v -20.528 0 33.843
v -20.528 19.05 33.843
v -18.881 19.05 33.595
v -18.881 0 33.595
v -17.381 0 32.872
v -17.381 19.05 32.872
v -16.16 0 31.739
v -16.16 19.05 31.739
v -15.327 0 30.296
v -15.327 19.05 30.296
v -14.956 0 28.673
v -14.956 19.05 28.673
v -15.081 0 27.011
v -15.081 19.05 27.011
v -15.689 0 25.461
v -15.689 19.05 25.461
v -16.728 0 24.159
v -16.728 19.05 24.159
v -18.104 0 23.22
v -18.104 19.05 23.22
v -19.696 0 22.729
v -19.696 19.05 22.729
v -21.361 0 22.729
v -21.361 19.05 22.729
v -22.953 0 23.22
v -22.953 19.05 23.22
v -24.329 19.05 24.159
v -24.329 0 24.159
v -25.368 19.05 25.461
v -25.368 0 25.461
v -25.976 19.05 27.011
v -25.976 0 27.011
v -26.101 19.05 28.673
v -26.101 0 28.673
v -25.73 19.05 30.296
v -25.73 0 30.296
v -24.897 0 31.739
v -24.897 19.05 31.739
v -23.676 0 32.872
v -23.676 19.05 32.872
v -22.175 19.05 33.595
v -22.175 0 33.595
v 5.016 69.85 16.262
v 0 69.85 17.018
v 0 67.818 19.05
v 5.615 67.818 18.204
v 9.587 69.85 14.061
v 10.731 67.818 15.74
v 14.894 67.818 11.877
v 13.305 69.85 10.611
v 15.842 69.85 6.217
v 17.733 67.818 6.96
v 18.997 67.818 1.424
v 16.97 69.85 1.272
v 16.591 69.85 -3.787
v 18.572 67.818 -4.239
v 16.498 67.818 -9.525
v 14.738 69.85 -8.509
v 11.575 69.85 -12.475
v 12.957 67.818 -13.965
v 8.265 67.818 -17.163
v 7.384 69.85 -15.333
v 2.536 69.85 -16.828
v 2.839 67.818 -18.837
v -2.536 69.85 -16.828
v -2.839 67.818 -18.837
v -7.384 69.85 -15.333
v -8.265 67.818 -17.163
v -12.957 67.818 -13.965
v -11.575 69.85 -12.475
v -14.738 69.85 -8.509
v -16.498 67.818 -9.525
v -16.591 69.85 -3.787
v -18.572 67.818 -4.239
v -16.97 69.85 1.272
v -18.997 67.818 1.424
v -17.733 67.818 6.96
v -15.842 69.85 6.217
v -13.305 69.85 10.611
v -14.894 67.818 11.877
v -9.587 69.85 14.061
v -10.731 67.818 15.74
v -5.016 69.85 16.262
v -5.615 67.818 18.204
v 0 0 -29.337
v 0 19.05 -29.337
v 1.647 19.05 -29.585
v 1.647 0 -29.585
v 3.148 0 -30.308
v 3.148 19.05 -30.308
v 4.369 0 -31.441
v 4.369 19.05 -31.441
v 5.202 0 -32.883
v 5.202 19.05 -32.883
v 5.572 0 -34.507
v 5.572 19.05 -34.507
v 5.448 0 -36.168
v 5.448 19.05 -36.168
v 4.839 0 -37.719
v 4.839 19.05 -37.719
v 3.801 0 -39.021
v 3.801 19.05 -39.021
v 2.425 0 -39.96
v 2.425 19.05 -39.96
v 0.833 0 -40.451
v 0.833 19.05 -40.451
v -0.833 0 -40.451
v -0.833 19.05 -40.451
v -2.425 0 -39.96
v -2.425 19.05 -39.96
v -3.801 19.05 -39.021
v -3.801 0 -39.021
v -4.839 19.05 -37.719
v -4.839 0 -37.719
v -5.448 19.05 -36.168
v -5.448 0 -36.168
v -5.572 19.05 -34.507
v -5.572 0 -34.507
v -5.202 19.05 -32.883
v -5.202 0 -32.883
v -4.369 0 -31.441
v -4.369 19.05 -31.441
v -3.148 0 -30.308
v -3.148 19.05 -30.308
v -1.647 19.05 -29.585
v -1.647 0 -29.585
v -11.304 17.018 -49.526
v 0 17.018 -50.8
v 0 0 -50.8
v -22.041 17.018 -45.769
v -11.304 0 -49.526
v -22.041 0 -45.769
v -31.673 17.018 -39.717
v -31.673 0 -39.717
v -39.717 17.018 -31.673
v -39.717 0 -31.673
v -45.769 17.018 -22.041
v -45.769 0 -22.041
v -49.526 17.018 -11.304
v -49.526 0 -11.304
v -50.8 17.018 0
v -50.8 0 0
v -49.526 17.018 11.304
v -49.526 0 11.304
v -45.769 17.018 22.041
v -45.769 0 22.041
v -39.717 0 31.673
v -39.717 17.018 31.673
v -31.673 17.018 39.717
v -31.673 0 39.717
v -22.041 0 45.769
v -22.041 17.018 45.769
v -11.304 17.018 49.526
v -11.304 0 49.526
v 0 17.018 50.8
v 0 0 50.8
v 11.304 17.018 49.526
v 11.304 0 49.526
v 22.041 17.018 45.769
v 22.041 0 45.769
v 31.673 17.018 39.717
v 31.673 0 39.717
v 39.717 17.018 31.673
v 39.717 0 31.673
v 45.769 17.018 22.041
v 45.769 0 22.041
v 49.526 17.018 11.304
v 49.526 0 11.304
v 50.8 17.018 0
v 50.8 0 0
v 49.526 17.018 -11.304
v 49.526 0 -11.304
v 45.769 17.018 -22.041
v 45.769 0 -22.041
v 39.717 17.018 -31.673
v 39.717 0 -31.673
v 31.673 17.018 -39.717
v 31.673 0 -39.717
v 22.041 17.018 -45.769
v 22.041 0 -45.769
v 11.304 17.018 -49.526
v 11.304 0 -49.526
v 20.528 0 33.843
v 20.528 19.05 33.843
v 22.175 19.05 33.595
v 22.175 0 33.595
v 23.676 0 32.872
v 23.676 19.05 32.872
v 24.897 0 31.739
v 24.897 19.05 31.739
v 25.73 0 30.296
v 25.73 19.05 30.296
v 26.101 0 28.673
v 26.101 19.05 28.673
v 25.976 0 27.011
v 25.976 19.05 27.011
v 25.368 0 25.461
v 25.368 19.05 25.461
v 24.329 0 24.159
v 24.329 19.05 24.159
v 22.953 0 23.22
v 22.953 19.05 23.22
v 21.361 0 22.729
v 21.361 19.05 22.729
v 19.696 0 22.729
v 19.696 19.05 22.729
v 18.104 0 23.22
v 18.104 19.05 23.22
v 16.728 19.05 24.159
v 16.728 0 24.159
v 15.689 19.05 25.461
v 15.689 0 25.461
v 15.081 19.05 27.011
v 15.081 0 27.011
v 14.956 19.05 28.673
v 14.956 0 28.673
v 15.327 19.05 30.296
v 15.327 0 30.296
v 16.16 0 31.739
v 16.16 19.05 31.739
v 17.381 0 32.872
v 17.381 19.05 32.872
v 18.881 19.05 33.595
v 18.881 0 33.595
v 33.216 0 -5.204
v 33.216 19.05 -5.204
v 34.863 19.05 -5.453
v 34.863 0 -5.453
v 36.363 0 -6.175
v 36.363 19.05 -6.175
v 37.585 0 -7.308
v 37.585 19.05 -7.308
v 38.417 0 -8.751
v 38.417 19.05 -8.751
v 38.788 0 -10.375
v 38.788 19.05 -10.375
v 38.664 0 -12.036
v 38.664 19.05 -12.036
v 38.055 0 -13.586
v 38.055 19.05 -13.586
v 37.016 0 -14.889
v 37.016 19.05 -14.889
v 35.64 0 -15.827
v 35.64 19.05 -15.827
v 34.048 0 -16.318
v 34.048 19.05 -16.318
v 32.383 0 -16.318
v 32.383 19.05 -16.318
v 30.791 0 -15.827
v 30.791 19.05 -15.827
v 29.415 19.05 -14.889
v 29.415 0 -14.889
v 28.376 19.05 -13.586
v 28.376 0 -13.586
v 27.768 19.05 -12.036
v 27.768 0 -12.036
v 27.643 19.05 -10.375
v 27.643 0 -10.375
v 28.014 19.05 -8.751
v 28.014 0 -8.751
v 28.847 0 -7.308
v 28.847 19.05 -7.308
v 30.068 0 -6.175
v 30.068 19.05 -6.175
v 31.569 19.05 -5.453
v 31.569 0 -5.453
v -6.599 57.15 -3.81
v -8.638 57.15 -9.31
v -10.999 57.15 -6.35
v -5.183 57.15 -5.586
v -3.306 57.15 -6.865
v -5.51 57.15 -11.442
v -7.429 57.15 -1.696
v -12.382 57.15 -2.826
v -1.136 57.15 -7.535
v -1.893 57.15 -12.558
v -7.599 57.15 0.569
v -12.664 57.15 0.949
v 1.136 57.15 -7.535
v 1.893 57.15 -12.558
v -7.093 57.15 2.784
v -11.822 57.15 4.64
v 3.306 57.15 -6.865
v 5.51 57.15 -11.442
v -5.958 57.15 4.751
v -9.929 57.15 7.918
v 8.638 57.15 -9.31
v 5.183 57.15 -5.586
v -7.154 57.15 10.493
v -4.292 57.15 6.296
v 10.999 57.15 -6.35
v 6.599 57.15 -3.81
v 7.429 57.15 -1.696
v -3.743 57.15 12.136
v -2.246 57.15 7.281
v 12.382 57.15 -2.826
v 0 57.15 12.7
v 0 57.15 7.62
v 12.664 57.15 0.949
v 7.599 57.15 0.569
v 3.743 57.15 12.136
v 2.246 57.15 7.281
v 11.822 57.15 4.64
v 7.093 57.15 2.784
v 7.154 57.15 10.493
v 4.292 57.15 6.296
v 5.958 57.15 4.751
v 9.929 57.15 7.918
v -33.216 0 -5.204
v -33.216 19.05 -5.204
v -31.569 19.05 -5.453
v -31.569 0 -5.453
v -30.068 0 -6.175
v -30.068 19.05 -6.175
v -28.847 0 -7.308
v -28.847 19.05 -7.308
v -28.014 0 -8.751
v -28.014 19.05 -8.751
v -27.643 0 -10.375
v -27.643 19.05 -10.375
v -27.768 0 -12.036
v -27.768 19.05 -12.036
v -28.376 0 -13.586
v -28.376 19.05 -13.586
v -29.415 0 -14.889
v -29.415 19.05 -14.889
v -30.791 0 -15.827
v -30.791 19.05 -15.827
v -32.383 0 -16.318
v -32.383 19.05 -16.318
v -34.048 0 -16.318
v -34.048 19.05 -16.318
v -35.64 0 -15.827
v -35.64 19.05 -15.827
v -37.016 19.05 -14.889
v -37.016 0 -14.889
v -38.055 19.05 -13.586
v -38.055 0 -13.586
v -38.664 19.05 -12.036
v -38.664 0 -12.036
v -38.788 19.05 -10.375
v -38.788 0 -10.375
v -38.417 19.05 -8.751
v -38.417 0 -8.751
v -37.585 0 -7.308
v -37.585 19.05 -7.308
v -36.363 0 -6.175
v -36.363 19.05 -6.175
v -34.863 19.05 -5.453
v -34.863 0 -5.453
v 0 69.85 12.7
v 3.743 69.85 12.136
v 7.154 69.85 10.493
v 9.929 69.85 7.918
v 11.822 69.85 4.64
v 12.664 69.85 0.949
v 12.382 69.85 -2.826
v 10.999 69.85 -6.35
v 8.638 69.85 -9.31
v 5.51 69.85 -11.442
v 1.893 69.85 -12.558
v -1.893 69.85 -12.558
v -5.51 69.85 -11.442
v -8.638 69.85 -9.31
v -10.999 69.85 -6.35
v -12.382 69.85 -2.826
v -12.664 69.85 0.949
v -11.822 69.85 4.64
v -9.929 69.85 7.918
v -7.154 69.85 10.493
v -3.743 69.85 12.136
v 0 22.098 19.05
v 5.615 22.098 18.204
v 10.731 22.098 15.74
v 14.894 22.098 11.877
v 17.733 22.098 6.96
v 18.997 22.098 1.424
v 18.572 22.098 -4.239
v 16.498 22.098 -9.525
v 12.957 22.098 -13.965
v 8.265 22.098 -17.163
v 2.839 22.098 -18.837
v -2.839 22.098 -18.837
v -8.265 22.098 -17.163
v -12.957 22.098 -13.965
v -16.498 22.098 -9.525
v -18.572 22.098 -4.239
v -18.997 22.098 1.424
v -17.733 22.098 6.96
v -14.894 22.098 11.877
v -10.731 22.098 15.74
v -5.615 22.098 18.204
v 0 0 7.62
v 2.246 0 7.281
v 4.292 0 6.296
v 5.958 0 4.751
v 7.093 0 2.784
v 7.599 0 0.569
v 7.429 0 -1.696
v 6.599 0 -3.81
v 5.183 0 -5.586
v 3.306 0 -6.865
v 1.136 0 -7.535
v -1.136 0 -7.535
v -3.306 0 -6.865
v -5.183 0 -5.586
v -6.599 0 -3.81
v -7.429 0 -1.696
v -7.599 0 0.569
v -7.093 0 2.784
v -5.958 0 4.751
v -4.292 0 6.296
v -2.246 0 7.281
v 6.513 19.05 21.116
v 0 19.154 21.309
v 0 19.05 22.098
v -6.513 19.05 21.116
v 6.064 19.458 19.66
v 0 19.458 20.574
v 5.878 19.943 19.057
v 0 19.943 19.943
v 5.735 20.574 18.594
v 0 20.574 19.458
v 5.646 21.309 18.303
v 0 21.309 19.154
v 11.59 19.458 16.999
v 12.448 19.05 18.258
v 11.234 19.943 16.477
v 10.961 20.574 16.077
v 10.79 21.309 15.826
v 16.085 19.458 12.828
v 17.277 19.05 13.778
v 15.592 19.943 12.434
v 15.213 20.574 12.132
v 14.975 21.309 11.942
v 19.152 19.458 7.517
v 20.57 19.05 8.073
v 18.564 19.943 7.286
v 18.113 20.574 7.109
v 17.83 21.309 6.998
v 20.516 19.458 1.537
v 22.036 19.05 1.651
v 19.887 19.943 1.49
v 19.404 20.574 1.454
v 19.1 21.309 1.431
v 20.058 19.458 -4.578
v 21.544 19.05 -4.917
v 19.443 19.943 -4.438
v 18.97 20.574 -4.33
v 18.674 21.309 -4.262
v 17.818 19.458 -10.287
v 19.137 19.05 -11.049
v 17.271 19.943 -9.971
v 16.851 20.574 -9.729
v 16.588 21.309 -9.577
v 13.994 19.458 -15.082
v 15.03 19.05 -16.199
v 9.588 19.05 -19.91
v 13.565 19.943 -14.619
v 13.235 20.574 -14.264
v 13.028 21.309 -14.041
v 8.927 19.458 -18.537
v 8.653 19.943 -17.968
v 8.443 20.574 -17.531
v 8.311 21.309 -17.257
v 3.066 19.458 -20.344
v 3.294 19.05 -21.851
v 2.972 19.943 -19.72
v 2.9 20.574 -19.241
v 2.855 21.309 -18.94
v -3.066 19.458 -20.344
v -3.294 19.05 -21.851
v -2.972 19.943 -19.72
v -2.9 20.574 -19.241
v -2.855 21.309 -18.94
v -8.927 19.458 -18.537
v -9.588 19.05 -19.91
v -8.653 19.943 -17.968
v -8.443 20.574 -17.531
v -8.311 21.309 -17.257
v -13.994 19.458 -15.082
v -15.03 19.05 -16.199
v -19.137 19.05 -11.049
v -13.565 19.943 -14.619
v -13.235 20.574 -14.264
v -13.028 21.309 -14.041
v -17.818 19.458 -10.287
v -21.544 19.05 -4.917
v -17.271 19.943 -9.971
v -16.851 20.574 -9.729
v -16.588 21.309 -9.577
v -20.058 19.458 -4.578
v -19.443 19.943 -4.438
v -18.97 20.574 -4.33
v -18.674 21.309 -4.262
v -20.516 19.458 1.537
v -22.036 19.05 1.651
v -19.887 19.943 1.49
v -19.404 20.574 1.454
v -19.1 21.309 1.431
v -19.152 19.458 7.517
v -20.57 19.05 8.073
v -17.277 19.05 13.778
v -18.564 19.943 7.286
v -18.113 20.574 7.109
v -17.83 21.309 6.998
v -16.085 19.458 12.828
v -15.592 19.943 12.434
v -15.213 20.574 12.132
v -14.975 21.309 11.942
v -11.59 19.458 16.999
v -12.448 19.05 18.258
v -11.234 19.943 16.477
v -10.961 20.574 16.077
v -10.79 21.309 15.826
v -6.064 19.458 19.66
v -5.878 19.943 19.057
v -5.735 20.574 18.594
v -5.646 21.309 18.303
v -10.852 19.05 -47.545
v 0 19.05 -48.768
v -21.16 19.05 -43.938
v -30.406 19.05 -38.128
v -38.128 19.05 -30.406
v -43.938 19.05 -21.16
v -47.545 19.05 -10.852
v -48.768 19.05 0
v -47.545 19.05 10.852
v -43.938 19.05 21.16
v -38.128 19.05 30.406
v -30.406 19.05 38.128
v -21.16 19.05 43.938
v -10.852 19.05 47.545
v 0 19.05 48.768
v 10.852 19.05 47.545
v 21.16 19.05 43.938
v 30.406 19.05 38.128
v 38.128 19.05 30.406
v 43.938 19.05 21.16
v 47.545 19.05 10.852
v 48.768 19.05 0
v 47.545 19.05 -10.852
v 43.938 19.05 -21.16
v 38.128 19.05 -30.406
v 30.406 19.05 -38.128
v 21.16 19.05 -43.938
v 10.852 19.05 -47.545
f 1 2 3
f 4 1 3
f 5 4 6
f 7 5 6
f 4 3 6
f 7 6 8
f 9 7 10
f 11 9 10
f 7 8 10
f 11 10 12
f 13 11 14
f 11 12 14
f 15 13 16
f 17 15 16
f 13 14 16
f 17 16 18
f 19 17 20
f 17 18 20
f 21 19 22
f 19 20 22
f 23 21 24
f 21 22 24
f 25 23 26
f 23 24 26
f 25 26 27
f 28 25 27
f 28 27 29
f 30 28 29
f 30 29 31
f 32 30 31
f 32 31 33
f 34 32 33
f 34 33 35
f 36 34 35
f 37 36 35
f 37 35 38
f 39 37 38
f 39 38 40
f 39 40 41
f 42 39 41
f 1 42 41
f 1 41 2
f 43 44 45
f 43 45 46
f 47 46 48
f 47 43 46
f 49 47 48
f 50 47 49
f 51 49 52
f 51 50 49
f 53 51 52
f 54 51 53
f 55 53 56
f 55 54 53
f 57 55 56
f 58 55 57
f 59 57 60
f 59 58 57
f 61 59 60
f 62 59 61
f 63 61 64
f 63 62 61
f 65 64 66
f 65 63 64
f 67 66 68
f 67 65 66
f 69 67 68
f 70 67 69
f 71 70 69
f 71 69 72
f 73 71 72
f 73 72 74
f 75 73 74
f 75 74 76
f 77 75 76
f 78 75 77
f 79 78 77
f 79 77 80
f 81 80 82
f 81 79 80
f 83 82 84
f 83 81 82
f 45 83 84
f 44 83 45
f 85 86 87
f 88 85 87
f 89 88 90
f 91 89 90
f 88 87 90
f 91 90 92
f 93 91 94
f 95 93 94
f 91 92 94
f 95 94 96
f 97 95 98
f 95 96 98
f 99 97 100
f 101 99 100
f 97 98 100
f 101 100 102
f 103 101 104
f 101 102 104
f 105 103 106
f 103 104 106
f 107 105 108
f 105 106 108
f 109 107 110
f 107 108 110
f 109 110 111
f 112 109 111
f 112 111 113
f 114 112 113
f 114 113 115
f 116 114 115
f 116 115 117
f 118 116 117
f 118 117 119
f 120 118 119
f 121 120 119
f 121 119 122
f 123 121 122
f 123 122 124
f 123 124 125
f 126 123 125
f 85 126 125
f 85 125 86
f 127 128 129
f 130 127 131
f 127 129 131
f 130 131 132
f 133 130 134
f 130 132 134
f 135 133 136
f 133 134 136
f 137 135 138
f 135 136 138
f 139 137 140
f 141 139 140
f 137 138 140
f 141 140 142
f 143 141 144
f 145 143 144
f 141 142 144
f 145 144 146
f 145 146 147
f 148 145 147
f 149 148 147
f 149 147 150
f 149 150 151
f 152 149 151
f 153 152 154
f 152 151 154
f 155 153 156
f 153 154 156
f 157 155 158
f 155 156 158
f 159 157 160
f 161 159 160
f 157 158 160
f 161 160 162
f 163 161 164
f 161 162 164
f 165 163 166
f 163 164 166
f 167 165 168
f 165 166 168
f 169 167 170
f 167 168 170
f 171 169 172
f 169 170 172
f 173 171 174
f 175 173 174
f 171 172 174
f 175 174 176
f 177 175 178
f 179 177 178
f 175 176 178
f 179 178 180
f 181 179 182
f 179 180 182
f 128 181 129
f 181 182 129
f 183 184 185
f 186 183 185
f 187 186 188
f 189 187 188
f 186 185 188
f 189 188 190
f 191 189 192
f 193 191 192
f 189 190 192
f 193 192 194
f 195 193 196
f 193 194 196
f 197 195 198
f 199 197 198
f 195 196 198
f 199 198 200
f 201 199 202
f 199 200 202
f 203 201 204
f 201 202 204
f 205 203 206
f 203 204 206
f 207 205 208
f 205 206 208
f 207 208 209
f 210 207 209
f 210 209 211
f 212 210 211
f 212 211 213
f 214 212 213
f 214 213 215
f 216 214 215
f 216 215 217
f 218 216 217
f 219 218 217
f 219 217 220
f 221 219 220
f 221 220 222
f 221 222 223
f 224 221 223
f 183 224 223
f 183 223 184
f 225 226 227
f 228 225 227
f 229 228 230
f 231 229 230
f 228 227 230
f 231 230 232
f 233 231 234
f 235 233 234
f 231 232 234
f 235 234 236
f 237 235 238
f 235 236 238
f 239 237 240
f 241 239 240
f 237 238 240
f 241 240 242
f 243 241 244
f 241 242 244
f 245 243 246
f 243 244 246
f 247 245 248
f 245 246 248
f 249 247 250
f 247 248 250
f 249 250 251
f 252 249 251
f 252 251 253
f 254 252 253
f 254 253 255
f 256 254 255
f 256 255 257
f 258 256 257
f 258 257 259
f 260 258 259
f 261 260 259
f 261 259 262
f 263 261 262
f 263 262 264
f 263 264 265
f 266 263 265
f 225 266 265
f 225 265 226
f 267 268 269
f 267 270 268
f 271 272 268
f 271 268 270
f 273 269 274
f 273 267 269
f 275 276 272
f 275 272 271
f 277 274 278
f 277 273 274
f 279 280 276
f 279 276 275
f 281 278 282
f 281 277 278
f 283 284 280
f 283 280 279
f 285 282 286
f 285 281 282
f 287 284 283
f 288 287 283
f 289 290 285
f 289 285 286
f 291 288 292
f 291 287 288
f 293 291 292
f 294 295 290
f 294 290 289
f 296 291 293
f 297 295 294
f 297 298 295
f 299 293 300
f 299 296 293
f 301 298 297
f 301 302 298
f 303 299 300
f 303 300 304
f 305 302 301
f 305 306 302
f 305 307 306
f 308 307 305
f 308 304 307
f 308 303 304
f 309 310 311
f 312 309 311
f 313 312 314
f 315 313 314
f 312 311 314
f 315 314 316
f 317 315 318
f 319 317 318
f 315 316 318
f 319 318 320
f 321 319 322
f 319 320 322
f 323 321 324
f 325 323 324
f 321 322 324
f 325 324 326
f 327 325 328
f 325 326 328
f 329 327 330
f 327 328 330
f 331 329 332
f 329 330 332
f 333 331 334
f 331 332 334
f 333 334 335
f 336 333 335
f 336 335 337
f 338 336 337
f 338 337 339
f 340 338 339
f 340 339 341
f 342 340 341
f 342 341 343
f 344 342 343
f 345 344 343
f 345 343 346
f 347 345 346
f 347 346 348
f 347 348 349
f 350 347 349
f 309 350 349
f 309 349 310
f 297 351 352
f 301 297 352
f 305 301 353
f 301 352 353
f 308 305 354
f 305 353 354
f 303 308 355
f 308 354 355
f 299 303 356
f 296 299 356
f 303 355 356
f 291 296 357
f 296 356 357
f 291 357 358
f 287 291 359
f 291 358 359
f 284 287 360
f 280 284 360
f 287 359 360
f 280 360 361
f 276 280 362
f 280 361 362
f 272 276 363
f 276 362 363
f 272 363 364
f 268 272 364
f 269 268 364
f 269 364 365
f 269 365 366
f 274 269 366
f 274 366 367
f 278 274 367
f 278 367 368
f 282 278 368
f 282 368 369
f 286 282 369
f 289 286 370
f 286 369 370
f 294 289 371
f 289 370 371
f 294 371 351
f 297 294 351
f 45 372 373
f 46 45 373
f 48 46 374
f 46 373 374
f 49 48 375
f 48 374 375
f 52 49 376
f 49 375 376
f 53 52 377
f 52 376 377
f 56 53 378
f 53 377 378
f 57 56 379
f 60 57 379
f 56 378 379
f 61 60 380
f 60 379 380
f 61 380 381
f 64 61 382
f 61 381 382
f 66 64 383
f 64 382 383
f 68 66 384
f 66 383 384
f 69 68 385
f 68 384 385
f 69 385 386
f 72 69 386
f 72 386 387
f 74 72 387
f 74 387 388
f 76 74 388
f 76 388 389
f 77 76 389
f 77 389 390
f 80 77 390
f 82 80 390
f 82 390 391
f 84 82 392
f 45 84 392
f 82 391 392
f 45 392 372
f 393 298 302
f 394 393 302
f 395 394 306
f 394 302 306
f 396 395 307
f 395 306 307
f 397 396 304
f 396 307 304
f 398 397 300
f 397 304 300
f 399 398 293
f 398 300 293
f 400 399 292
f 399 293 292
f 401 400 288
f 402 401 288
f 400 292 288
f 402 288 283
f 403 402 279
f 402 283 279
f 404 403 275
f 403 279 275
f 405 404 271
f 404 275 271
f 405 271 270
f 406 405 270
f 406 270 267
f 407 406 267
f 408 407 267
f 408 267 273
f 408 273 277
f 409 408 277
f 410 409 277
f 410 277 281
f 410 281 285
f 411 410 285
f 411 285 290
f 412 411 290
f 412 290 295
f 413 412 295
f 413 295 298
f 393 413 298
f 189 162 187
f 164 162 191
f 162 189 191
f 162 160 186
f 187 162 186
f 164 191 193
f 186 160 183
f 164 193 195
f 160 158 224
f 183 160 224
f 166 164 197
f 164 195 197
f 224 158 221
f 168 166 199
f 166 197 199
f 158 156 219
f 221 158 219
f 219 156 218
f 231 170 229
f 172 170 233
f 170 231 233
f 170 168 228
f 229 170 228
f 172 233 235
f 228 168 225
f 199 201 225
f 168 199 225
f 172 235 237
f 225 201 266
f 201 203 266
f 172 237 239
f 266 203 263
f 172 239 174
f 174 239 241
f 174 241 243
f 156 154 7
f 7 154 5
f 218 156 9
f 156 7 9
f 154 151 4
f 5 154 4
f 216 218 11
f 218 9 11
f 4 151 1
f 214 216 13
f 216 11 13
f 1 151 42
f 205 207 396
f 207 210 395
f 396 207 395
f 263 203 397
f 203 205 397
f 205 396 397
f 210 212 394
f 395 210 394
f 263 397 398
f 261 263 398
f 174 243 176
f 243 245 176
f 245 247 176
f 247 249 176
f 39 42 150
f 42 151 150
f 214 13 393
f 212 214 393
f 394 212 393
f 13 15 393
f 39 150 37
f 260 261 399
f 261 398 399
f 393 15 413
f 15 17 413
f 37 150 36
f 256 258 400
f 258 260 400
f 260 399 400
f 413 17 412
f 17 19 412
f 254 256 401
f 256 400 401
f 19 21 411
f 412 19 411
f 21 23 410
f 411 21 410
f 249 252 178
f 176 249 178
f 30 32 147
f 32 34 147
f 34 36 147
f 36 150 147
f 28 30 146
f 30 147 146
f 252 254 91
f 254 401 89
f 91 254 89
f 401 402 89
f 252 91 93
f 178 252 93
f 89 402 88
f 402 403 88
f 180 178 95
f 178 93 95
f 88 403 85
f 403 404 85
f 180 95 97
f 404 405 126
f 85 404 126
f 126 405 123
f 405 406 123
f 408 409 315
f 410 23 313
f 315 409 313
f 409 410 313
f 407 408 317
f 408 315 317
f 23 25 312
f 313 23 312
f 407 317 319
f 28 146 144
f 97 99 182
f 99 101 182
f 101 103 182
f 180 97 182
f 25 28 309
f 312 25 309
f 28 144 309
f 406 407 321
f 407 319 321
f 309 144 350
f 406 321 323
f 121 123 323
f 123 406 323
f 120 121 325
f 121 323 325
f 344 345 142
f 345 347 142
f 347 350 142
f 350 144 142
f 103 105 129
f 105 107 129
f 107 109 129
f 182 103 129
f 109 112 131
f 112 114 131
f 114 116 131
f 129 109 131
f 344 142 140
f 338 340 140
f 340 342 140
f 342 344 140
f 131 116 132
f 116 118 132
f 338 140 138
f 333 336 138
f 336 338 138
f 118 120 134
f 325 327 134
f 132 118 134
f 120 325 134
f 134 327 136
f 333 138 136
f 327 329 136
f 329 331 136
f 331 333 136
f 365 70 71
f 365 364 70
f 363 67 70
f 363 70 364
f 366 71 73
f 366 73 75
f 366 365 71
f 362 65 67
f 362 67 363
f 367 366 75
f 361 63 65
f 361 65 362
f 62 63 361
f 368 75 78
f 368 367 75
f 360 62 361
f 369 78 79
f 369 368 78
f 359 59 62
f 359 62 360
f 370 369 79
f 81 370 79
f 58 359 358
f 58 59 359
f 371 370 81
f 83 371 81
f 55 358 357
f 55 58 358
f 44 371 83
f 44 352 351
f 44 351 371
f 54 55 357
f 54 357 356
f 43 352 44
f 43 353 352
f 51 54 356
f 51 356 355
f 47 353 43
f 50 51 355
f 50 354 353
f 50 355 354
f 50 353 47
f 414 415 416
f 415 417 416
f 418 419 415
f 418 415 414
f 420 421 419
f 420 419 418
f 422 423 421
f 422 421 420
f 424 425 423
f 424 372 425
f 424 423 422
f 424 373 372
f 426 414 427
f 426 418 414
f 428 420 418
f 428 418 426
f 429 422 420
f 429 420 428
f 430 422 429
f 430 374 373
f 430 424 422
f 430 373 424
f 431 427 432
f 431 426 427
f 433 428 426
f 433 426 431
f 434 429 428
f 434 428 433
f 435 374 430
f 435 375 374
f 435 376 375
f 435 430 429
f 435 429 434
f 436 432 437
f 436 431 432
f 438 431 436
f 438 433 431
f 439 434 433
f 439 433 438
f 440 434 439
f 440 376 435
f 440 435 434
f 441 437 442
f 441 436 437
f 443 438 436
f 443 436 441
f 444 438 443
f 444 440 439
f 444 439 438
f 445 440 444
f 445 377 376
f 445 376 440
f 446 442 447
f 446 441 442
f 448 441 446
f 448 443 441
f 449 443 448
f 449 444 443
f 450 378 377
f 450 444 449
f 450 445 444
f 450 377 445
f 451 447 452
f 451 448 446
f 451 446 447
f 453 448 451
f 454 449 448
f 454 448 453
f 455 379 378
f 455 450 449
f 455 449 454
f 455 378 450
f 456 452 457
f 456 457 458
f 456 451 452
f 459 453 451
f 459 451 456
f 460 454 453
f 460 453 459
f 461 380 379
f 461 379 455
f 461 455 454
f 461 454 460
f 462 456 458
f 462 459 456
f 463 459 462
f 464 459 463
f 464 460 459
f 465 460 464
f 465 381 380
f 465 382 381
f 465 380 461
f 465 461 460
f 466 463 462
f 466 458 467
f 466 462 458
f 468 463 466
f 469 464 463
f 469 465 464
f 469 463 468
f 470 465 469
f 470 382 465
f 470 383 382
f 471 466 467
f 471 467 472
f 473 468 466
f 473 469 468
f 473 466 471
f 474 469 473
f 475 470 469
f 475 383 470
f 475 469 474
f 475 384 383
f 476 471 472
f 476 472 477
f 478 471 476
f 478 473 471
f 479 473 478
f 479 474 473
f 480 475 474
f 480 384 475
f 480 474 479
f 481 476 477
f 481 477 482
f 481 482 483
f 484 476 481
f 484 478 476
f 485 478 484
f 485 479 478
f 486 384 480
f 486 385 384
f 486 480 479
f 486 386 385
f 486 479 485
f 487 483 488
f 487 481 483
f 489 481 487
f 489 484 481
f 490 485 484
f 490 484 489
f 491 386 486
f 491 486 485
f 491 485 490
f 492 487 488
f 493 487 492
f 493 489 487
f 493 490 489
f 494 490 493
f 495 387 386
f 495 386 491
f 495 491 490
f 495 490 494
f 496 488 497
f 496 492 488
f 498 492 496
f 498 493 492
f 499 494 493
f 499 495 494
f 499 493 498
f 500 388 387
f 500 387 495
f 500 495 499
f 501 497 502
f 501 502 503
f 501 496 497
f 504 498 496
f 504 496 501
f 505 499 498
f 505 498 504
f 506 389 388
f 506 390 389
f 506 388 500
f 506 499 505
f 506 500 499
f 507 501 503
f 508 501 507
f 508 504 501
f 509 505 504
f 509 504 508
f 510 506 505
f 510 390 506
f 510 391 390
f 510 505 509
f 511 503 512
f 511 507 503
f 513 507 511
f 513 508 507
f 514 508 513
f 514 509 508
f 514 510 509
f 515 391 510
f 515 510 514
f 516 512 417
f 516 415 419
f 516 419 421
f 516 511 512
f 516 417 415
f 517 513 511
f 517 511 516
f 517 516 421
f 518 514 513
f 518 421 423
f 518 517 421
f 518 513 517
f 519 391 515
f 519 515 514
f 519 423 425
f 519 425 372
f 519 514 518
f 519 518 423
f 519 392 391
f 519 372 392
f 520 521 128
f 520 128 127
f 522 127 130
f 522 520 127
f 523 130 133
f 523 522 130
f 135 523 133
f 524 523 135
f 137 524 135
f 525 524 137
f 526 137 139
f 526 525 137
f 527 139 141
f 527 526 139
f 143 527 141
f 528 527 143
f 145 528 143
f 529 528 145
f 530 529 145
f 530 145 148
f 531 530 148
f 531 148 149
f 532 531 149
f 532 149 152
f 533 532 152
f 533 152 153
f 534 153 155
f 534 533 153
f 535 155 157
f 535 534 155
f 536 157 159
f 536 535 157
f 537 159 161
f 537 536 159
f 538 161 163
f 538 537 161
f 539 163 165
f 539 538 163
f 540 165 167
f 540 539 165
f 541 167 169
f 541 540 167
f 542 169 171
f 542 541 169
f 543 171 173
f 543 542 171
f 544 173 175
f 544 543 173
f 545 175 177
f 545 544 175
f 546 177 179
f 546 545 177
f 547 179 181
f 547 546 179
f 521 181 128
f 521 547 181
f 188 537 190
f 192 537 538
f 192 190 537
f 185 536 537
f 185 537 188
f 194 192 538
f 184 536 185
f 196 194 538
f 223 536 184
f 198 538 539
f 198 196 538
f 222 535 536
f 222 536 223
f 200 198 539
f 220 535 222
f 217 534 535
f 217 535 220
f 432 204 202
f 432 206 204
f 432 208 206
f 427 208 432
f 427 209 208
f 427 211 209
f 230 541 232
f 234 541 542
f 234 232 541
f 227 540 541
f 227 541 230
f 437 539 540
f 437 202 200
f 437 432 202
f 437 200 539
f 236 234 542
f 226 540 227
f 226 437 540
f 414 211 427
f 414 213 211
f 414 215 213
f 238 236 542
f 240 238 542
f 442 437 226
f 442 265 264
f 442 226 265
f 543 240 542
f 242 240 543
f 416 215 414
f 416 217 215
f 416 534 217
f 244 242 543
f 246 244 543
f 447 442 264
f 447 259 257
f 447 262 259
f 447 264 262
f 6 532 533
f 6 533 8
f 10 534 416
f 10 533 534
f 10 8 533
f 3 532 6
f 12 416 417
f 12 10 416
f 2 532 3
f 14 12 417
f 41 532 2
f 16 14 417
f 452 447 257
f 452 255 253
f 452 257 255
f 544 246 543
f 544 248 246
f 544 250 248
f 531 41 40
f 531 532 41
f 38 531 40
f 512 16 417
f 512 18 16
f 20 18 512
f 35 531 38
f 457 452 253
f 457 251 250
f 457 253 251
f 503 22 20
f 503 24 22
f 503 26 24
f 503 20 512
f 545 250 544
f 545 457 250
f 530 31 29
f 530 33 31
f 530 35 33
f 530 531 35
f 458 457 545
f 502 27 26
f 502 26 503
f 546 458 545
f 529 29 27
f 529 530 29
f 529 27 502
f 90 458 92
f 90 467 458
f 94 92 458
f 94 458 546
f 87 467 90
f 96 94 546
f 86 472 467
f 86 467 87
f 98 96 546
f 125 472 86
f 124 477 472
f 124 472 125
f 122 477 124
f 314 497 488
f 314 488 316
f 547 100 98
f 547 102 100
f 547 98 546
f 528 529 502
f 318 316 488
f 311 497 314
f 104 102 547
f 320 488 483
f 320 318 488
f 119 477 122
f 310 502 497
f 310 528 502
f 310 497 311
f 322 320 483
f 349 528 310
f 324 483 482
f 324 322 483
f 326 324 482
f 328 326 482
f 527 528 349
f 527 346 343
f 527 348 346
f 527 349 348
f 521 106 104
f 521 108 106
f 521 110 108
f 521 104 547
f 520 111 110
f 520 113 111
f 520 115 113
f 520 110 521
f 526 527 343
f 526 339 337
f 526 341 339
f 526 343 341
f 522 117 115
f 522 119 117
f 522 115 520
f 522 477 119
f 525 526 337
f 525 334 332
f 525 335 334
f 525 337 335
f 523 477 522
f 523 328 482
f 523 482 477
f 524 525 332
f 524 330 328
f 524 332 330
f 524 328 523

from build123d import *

# Parameters (mm, degrees)
SKETCH1_R           = 50.8
BOSS_EXTRUDE1_DEPTH = 19.05
CHAMFER1_SIZE       = 2.032
SKETCH2_R           = 5.588
CUT_EXTRUDE2_DEPTH  = 75.324844433
SKETCH4_R           = 19.05
BOSS_EXTRUDE2_DEPTH = 50.8
FILLET1_R           = 3.048
CHAMFER2_SIZE       = 2.032
SKETCH5_R           = 12.7
CUT_EXTRUDE3_DEPTH  = 12.7
SKETCH6_R           = 7.62
CUT_EXTRUDE4_DEPTH  = 92.800885072


with BuildPart() as part:
    # Sketch1 → Boss-Extrude1 (new body)
    with BuildSketch(Plane(origin=(0, 0, 0), x_dir=(1, 0, 0), z_dir=(0, 1, 0))):
        with Locations(Location((0, 0, 0), (0, 0, 90))):
            Circle(SKETCH1_R)
    extrude(amount=BOSS_EXTRUDE1_DEPTH)

    # Chamfer1
    chamfer1_edges = [part.edges().sort_by_distance(p)[0] for p in [
        (0, 19.05, 50.8),
    ]]
    chamfer(chamfer1_edges, length=CHAMFER1_SIZE)

    # Sketch2 → Cut-Extrude2 (cut, through all)
    with BuildSketch(Plane(origin=(0, 19.05, 0), x_dir=(1, 0, 0), z_dir=(0, 1, 0))):
        with Locations(Location((0, 34.925, 0), (0, 0, 270))):
            Circle(SKETCH2_R)
        with Locations(Location((33.215648832, 10.792418529, 0), (0, 0, 270))):
            Circle(SKETCH2_R)
        with Locations(Location((20.528399936, -28.254918529, 0), (0, 0, 270))):
            Circle(SKETCH2_R)
        with Locations(Location((-20.528399936, -28.254918529, 0), (0, 0, 270))):
            Circle(SKETCH2_R)
        with Locations(Location((-33.215648832, 10.792418529, 0), (0, 0, 270))):
            Circle(SKETCH2_R)
    extrude(amount=-CUT_EXTRUDE2_DEPTH, mode=Mode.SUBTRACT)

    # Sketch4 → Boss-Extrude2 (add)
    with BuildSketch(Plane(origin=(0, 19.05, 0), x_dir=(1, 0, 0), z_dir=(0, 1, 0))):
        with Locations(Location((0, 0, 0), (0, 0, 270))):
            Circle(SKETCH4_R)
    extrude(amount=BOSS_EXTRUDE2_DEPTH)

    # Fillet1
    fillet1_edges = [part.edges().sort_by_distance(p)[0] for p in [
        (0, 19.05, -19.05),
    ]]
    fillet(fillet1_edges, radius=FILLET1_R)

    # Chamfer2
    chamfer2_edges = [part.edges().sort_by_distance(p)[0] for p in [
        (0, 69.85, -19.05),
    ]]
    chamfer(chamfer2_edges, length=CHAMFER2_SIZE)

    # Sketch5 → Cut-Extrude3 (cut)
    with BuildSketch(Plane(origin=(0, 69.85, 0), x_dir=(1, 0, 0), z_dir=(0, 1, 0))):
        with Locations(Location((0, 0, 0), (0, 0, 270))):
            Circle(SKETCH5_R)
    extrude(amount=-CUT_EXTRUDE3_DEPTH, mode=Mode.SUBTRACT)

    # Sketch6 → Cut-Extrude4 (cut, through all)
    with BuildSketch(Plane(origin=(0, 57.15, 0), x_dir=(1, 0, 0), z_dir=(0, 1, 0))):
        with Locations(Location((0, 0, 0), (0, 0, 270))):
            Circle(SKETCH6_R)
    extrude(amount=-CUT_EXTRUDE4_DEPTH, mode=Mode.SUBTRACT)


solid = part.part
